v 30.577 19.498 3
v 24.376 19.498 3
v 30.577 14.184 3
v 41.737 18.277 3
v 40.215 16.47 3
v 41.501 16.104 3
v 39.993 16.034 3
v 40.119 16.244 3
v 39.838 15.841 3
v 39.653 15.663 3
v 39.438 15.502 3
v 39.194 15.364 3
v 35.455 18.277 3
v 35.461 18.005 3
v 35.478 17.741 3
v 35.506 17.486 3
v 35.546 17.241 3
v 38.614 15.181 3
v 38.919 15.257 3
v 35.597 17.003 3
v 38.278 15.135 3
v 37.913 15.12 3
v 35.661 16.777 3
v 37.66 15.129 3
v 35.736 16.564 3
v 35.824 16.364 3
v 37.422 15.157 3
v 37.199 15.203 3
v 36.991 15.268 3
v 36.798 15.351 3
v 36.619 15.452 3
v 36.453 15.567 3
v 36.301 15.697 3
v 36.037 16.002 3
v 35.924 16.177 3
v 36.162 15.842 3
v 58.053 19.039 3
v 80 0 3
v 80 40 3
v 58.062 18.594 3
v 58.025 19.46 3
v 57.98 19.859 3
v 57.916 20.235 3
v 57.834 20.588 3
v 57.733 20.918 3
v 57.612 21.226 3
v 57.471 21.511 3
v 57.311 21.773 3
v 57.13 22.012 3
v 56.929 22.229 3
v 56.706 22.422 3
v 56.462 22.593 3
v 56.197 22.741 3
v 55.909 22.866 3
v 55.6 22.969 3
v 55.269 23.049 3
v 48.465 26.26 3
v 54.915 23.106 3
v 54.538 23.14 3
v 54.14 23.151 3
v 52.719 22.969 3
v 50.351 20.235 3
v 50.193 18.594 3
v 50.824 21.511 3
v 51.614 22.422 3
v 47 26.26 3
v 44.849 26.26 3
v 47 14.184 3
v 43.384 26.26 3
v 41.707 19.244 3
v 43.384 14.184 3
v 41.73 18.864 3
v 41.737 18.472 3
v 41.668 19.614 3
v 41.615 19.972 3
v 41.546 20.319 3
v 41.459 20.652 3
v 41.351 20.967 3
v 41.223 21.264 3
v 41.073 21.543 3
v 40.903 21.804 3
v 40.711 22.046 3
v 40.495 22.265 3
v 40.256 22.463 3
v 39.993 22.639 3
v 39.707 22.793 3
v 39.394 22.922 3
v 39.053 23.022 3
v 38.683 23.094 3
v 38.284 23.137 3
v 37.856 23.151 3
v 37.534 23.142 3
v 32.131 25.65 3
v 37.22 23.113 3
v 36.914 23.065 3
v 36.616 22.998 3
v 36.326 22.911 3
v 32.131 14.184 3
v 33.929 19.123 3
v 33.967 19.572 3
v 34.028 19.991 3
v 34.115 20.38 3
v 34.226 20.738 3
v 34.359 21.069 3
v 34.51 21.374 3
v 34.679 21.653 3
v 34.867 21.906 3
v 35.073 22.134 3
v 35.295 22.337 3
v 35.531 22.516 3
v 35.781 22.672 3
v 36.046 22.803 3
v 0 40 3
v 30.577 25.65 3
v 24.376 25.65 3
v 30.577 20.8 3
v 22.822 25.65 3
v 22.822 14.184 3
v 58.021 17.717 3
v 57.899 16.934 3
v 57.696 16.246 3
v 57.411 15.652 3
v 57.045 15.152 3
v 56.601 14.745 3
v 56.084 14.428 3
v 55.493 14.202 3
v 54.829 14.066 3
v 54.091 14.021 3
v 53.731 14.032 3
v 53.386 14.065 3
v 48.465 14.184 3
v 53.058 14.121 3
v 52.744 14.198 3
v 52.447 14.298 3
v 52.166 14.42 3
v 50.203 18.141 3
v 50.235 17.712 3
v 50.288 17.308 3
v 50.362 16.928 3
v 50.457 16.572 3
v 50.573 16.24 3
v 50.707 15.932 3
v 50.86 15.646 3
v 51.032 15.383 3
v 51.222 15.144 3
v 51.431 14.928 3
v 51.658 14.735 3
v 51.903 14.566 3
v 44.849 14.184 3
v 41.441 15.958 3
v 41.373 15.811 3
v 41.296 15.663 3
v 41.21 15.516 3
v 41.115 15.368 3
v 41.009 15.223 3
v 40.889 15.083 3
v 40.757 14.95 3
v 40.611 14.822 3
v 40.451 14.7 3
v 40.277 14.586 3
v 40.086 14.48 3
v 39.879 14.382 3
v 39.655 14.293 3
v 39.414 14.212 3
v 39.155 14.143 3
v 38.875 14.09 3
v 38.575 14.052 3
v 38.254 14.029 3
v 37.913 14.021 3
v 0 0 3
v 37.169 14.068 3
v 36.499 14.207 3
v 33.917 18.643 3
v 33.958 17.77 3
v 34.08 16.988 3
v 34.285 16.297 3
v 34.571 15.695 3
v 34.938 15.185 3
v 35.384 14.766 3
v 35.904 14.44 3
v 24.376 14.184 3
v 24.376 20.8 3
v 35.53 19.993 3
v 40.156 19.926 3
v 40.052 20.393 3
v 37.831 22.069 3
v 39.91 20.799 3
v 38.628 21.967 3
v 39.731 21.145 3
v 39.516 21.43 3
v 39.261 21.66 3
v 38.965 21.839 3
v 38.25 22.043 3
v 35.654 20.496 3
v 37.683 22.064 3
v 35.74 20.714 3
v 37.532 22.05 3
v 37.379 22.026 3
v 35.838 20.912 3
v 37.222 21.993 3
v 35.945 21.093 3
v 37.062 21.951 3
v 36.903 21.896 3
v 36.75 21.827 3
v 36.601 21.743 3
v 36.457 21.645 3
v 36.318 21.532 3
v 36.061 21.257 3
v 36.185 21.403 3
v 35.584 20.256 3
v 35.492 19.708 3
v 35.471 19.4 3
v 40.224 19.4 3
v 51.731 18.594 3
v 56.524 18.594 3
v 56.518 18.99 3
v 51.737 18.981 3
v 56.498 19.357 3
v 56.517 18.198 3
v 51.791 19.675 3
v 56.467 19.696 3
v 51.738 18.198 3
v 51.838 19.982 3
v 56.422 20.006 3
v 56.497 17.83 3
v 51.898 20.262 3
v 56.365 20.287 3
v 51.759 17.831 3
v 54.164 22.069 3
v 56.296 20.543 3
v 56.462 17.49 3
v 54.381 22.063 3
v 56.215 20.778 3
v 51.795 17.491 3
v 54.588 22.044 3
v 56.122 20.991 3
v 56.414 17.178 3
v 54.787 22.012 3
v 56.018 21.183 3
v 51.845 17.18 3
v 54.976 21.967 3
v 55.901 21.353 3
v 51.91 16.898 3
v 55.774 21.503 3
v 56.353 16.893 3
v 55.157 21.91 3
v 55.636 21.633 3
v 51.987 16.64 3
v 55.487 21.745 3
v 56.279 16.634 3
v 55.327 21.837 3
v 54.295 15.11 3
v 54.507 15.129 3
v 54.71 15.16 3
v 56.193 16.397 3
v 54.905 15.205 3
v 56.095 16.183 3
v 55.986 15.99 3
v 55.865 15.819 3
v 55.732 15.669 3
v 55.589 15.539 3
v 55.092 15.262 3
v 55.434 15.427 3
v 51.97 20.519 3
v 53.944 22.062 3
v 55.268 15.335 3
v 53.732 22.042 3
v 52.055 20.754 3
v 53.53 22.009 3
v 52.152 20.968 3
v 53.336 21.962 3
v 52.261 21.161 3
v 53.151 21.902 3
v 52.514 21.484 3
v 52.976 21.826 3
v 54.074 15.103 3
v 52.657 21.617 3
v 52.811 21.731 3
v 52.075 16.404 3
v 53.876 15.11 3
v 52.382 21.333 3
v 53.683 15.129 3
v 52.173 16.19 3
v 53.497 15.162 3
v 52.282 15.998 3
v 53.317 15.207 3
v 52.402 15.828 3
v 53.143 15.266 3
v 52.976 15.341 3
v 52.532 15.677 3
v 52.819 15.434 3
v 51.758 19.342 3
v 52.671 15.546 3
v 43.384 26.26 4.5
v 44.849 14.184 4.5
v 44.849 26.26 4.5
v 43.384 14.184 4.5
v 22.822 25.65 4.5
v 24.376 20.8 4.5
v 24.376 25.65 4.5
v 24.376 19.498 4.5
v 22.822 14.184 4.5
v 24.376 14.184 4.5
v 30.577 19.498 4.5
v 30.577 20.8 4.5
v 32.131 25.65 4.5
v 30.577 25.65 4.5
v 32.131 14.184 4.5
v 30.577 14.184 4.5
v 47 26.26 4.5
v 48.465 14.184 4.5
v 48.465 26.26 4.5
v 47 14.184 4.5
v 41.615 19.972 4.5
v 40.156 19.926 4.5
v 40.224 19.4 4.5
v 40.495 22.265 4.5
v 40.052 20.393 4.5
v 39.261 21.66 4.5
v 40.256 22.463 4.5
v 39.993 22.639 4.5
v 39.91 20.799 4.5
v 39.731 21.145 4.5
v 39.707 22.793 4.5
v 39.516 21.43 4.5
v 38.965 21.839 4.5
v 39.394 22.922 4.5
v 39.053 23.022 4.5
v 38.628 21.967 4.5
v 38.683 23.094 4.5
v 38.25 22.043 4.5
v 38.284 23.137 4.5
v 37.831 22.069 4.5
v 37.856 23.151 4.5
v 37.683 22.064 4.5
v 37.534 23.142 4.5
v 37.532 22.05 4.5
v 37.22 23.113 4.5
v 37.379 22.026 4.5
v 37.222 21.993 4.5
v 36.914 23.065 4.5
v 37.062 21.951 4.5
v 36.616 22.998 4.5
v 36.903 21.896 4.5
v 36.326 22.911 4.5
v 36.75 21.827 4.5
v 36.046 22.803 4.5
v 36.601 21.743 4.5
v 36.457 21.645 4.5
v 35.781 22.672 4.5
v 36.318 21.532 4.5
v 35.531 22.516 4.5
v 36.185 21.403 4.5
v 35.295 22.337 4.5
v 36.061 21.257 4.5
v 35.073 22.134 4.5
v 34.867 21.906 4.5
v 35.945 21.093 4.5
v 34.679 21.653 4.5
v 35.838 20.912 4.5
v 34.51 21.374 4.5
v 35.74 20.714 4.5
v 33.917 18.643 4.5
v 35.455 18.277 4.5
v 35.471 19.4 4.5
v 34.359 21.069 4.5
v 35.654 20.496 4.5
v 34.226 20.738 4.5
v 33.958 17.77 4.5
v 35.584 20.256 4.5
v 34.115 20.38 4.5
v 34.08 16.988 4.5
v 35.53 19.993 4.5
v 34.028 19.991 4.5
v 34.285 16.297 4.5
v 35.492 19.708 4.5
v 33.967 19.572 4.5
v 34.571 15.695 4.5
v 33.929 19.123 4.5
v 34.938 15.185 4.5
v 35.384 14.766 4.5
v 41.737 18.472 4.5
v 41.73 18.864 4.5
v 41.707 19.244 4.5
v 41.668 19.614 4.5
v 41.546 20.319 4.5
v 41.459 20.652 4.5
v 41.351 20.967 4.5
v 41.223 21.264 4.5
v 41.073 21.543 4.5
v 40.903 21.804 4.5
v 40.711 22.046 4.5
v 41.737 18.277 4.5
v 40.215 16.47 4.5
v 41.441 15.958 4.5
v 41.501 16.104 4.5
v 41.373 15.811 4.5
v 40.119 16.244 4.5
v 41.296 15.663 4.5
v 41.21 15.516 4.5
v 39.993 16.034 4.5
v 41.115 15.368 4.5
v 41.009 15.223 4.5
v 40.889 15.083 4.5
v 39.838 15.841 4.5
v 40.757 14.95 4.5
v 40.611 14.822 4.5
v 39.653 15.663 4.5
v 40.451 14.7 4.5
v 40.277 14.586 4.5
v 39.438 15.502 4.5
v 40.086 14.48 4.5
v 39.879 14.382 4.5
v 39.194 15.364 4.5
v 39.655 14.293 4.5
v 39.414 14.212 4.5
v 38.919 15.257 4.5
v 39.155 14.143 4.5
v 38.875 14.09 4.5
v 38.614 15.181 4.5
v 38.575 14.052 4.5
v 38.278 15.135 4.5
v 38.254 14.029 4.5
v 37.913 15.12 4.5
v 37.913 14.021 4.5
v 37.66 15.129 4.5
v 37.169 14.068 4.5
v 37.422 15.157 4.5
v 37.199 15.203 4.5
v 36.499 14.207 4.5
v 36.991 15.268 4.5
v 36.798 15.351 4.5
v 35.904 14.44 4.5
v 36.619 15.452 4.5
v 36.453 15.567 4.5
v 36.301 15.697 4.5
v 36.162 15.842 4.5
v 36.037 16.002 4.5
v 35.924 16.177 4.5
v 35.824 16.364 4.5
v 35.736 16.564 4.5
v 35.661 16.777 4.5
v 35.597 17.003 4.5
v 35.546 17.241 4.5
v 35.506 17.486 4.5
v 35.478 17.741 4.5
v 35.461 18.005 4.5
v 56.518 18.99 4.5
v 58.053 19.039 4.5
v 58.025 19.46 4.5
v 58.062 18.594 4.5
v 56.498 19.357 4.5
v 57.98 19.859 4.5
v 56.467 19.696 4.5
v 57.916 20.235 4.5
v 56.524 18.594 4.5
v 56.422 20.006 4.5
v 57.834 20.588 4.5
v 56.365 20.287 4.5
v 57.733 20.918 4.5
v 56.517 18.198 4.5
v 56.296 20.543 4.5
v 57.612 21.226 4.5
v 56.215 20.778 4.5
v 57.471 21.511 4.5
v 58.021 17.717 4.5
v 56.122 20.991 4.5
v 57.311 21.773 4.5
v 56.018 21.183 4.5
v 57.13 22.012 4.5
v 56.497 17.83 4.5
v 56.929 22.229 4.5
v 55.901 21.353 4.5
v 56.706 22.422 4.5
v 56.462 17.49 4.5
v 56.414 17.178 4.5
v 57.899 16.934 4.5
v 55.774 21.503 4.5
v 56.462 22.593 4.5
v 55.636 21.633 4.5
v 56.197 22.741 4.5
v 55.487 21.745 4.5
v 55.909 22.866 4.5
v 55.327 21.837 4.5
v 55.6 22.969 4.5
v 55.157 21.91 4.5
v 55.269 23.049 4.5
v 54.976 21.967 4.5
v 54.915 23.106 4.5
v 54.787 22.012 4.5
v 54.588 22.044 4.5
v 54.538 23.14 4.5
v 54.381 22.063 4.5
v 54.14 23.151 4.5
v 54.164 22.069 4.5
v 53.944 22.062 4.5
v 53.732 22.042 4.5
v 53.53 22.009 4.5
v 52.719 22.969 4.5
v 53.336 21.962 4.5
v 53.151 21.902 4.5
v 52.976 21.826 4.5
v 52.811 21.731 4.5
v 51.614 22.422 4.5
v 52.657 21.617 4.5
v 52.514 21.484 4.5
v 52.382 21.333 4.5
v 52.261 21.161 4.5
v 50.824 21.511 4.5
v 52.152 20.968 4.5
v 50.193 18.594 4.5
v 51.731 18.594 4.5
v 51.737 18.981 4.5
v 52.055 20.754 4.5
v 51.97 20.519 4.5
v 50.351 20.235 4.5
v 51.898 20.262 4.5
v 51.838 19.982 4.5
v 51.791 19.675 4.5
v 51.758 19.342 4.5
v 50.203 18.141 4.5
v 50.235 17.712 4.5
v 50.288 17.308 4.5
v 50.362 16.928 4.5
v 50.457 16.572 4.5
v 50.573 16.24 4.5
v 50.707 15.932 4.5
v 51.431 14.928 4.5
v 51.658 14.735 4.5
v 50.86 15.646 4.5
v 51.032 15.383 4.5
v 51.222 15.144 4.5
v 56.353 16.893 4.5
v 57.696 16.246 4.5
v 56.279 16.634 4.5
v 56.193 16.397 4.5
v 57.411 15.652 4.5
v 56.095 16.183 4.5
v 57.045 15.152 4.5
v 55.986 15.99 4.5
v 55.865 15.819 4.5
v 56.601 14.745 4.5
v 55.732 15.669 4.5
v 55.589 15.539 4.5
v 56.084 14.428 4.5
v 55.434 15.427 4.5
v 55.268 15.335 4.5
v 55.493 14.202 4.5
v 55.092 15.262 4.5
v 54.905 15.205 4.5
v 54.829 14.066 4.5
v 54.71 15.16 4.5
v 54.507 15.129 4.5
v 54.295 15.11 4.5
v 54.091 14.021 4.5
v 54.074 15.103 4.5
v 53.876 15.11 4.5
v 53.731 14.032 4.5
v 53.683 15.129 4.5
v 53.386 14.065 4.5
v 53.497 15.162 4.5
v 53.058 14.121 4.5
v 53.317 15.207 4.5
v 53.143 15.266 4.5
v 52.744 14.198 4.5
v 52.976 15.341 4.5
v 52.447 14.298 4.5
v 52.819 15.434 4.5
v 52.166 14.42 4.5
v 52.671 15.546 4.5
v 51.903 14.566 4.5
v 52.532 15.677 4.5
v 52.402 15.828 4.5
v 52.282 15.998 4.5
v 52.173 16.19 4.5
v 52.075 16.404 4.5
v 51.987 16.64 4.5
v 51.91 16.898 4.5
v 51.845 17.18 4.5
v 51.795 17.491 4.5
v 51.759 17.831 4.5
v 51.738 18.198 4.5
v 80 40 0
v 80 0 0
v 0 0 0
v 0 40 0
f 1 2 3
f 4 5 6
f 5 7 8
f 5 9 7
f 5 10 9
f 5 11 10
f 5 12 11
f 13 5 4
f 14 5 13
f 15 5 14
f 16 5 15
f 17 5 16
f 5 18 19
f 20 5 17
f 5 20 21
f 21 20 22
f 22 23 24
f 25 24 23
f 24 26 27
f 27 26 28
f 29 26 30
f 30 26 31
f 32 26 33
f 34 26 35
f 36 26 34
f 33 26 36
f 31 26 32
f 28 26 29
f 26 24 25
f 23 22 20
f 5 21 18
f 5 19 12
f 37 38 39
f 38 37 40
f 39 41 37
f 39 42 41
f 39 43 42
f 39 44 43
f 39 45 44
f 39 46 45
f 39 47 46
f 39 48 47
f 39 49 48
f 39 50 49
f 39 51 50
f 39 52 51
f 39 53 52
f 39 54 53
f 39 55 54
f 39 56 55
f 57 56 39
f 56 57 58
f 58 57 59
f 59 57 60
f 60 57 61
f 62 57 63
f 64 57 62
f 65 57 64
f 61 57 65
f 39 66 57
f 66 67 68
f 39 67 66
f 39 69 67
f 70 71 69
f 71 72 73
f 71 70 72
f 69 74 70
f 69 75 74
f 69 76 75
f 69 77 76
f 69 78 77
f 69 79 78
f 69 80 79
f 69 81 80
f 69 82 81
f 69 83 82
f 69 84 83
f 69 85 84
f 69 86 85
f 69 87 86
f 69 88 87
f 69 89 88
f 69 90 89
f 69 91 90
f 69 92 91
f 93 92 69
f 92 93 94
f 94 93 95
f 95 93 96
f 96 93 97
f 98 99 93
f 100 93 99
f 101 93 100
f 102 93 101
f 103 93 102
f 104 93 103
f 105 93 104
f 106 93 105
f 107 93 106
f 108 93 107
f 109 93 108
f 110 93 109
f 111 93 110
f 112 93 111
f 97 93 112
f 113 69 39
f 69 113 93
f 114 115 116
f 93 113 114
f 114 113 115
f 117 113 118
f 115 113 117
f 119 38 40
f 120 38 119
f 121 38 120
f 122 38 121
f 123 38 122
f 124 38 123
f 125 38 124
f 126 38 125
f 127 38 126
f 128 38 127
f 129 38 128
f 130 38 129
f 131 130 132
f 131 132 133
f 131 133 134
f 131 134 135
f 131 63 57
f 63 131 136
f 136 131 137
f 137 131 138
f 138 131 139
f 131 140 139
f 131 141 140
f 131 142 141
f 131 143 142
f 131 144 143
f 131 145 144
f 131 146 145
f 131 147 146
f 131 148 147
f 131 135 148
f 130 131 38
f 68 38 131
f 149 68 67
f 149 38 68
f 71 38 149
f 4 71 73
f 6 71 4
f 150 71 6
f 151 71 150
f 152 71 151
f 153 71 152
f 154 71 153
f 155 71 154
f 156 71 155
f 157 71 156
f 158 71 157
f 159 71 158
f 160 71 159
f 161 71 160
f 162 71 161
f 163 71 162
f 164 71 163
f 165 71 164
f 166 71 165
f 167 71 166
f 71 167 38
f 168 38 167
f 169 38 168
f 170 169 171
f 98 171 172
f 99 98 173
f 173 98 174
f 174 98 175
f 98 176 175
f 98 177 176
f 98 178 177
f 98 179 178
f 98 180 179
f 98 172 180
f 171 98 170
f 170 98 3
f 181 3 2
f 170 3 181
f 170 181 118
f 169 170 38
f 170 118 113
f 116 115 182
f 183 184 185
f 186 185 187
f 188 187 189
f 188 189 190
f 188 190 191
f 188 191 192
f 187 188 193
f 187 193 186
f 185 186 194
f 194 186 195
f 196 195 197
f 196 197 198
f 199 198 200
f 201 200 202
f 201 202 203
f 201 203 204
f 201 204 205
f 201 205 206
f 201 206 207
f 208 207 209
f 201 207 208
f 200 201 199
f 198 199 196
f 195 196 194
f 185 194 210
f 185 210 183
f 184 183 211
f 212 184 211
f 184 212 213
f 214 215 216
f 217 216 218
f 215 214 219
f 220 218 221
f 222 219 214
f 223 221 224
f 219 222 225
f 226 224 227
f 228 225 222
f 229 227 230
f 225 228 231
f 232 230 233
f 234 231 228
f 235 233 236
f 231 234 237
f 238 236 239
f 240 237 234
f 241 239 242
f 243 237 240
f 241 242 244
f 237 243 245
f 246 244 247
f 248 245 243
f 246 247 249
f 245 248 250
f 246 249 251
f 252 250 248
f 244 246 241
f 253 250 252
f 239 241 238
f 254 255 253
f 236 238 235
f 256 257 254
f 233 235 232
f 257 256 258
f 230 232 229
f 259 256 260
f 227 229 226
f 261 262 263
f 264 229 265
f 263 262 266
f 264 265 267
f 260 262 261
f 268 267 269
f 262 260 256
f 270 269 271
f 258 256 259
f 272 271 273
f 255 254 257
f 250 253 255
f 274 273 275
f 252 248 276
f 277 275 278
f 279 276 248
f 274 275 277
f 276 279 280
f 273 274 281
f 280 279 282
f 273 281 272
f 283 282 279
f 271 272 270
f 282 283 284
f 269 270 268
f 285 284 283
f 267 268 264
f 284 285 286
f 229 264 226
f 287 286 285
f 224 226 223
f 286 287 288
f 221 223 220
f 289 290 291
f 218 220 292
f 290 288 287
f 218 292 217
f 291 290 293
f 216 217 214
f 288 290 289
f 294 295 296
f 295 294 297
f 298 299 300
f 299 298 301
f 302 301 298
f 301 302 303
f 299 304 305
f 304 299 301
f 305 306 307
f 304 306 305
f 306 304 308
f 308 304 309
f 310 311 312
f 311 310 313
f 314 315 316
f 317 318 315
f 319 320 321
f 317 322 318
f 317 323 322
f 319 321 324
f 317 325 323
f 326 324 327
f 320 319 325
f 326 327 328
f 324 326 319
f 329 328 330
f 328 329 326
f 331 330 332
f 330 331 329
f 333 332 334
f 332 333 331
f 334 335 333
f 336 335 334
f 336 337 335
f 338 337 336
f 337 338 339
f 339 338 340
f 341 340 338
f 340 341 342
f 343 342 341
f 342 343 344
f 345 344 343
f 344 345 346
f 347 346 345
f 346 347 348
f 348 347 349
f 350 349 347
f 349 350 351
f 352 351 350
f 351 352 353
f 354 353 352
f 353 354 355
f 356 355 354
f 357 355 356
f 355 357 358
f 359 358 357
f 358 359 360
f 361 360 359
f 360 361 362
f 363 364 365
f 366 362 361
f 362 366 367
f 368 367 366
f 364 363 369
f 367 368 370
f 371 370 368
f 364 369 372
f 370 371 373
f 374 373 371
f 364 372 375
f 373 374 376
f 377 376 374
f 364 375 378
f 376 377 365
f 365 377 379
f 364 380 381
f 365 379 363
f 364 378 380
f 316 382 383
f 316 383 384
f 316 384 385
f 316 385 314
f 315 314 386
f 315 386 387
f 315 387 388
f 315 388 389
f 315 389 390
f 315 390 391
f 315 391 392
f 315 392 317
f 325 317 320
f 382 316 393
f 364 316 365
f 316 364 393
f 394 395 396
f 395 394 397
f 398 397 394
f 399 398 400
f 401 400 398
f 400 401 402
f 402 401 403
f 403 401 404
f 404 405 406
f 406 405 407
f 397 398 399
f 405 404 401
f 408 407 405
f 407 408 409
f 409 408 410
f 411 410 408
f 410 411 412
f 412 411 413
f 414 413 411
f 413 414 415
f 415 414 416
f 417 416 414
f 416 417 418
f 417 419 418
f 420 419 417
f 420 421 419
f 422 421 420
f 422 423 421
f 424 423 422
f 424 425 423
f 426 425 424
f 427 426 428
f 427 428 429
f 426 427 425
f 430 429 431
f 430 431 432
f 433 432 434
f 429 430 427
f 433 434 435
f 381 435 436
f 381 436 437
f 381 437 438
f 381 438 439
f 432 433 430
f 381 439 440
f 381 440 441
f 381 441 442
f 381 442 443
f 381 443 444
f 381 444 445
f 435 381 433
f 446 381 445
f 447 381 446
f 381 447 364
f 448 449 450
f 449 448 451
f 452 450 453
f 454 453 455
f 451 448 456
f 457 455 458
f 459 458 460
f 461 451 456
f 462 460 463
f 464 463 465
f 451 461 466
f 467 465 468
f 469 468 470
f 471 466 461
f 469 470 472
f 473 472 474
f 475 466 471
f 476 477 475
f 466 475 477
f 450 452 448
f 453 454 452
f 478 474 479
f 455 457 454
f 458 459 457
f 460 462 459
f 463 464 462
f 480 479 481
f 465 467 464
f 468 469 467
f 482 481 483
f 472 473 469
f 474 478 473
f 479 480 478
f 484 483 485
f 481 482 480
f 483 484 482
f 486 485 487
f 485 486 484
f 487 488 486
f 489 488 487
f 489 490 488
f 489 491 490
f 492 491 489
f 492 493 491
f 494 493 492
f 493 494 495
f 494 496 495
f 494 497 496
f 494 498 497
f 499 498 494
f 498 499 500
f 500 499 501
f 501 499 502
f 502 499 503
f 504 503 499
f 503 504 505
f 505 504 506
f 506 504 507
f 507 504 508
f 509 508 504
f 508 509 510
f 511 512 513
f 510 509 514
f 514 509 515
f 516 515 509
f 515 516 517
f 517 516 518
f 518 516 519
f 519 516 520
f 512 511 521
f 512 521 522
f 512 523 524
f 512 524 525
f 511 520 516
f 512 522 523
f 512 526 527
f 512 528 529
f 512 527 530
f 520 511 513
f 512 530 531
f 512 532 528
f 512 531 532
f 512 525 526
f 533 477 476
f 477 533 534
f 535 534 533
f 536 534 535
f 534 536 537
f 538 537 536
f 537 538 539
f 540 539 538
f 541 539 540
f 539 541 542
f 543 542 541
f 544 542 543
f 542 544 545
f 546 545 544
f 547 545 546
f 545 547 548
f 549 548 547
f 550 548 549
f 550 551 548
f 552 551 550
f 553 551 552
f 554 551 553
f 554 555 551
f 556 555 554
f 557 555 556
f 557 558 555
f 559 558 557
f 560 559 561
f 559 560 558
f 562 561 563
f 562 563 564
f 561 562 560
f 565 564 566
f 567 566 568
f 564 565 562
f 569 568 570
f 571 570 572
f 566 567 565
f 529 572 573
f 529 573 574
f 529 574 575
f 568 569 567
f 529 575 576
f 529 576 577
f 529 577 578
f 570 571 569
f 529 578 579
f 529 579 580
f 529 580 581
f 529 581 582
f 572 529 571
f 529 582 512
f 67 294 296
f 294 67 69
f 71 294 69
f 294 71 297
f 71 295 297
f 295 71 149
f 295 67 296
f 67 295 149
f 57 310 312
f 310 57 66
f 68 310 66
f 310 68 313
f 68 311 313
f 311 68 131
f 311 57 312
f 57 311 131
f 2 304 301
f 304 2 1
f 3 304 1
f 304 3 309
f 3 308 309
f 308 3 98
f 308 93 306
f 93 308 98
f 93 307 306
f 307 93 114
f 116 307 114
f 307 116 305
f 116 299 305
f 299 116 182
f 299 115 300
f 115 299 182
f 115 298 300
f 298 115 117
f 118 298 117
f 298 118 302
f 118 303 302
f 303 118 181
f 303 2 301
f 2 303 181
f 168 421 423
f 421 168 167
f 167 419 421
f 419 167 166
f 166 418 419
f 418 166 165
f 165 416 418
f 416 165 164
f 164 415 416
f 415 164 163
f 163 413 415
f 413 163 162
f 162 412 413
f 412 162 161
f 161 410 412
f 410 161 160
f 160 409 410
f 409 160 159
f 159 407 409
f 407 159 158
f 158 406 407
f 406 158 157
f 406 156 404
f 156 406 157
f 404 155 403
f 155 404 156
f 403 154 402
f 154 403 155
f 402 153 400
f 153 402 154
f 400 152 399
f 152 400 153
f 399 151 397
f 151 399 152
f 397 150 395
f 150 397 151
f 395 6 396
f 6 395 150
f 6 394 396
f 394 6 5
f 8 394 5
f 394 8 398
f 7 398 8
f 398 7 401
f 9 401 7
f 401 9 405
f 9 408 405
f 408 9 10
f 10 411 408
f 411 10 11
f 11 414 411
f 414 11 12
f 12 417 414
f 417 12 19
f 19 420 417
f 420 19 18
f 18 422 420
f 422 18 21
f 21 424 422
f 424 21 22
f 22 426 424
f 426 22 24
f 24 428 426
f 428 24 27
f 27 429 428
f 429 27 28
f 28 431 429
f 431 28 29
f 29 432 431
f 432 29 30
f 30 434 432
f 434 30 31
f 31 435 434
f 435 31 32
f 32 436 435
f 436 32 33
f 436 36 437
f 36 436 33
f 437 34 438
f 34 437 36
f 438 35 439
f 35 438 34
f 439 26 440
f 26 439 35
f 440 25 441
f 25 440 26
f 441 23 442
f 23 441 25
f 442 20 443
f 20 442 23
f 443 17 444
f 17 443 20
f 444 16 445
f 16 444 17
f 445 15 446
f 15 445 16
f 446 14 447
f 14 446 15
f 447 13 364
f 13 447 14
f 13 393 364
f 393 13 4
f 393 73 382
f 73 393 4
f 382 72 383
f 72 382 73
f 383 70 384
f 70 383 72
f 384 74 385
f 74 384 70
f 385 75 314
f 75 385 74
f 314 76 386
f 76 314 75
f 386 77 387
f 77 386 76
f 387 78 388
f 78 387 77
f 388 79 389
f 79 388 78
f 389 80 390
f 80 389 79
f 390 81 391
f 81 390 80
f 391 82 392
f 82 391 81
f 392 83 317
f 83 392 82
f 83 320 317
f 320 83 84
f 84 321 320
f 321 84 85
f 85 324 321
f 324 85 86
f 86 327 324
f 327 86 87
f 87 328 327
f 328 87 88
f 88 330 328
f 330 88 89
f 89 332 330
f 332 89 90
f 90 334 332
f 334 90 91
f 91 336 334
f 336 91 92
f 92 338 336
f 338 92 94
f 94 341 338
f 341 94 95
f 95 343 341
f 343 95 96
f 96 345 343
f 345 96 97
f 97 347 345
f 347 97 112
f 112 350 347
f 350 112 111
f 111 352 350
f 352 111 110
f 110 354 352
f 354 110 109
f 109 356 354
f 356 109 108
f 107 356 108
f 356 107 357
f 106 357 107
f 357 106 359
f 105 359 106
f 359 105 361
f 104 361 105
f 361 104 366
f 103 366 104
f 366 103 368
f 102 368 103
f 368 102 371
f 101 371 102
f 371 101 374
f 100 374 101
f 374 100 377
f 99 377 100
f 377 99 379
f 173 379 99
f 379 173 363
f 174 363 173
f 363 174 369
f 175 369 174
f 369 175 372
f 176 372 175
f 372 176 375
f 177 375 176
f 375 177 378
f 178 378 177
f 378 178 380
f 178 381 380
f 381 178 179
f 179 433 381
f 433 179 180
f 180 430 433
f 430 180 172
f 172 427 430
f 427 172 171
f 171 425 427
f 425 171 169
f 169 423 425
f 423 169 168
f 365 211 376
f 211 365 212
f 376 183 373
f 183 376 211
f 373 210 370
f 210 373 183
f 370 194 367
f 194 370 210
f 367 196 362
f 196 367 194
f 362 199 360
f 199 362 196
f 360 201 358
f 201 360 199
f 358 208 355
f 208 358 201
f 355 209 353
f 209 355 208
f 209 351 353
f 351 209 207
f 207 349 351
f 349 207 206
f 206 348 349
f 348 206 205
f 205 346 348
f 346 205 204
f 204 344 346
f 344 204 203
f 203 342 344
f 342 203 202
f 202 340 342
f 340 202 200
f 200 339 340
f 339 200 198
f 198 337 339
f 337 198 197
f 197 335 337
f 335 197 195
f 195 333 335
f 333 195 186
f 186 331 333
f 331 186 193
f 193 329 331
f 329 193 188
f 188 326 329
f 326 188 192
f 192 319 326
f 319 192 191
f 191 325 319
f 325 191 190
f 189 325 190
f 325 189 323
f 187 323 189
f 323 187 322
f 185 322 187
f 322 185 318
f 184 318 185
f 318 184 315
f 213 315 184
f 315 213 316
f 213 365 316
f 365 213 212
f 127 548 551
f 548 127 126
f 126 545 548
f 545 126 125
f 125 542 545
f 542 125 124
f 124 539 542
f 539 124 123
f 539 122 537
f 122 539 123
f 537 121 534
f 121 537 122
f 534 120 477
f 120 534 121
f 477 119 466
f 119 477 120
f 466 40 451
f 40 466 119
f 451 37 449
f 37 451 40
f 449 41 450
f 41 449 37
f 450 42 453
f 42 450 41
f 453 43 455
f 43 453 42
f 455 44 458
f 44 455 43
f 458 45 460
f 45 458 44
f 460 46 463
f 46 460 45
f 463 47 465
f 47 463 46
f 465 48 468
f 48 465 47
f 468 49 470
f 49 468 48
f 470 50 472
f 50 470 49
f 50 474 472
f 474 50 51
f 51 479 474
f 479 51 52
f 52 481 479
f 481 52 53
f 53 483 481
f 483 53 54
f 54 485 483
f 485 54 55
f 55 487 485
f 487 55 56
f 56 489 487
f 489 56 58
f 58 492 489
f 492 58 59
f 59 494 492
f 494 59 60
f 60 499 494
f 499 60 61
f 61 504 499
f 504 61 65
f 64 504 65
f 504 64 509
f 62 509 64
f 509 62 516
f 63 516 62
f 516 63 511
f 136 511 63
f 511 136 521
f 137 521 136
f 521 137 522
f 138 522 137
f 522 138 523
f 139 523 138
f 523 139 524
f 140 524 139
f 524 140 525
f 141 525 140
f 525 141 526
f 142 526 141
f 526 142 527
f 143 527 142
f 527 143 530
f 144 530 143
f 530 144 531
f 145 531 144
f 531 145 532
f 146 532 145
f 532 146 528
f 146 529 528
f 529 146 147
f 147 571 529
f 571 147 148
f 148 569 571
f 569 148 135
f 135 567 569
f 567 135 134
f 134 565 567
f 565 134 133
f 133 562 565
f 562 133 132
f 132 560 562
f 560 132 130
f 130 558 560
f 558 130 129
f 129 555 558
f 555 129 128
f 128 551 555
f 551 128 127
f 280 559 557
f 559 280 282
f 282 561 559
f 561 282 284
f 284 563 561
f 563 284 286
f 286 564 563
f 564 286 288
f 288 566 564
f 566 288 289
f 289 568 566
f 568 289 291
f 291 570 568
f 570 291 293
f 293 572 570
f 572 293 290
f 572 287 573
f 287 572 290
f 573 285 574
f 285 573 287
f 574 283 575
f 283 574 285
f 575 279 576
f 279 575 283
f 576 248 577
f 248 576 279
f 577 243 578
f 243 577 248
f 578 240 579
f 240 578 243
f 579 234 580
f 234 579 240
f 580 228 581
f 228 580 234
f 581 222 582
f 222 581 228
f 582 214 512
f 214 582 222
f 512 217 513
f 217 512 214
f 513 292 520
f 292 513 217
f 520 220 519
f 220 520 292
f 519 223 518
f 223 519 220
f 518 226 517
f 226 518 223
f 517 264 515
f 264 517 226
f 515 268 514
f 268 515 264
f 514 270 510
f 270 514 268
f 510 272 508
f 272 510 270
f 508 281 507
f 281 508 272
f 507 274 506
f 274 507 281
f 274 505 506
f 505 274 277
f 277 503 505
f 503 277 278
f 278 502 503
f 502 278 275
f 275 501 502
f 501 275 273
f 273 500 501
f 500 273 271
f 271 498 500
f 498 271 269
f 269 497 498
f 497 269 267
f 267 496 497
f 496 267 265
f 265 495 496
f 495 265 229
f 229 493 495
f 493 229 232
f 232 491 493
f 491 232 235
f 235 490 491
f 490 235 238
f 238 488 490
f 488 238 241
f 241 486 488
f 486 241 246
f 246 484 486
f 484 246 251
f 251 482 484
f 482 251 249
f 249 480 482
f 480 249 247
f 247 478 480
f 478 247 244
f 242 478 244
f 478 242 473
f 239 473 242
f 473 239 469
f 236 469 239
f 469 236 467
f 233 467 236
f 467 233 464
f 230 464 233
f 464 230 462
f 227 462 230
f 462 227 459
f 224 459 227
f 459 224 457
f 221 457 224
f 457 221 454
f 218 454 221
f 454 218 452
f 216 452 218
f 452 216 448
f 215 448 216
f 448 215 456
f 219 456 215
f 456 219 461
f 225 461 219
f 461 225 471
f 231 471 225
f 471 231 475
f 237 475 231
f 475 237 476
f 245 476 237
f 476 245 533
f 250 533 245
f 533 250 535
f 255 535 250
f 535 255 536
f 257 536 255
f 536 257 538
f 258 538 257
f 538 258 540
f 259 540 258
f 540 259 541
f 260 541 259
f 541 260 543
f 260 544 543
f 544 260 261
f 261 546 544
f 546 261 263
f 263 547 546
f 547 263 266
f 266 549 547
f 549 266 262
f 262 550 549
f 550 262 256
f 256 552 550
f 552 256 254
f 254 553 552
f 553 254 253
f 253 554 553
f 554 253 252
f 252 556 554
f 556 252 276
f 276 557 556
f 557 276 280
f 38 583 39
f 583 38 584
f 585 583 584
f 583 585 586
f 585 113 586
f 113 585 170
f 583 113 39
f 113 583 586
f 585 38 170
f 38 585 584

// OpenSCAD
// Yantra4D wrapper — Text Plaque
// Rectangular base with raised or inset text

message = "Hello";
font_size = 12;
text_depth = 1.5;
base_width = 80;
base_height = 40;
base_thickness = 3;
raised = true;
fn = 0;
render_mode = 0;

$fn = fn > 0 ? fn : 32;

// Font and clip.
//
// Neither kernel used to name a font, so each took its own default and the two
// typefaces set the same string at the same nominal size to different widths.
// That is this cartridge's entire parity gap: at preset name_plaque
// ("Your Name" at size 12 on an 80 mm plate) OpenSCAD's default face runs
// 81.656 mm and overhangs the plate by 0.83 mm at each end, against a
// CadQuery run that fits -- a 1.656 mm bounding-box difference on plaque,
// sign and tag alike. door_sign's 2.80% volume gap is the same cause measured
// on glyph AREA at equal depth.
//
// Naming the font on both sides removes the substitution. The clip below then
// makes the bound STRUCTURAL rather than font-dependent: raised text is
// intersected with the plate footprint, so no `message` within the
// parameter's 30-character budget can push the bounding box past base_width
// on either kernel, whichever face the render image happens to resolve. A cut
// can never grow the box, so the engraved branch needs the font only.
FONT = "Liberation Sans";


if (raised) {
    // Raised text: base + extruded text on top, clipped to the plate.
    union() {
        cube([base_width, base_height, base_thickness]);
        intersection() {
            translate([base_width / 2, base_height / 2, base_thickness])
                linear_extrude(text_depth)
                    text(message, size = font_size, font = FONT,
                         halign = "center", valign = "center");
            translate([0, 0, base_thickness])
                cube([base_width, base_height, text_depth]);
        }
    }
} else {
    // Inset text: base with text carved in
    difference() {
        cube([base_width, base_height, base_thickness]);
        translate([base_width / 2, base_height / 2, base_thickness - text_depth])
            linear_extrude(text_depth + 0.1)
                text(message, size = font_size, font = FONT,
                     halign = "center", valign = "center");
    }
}
